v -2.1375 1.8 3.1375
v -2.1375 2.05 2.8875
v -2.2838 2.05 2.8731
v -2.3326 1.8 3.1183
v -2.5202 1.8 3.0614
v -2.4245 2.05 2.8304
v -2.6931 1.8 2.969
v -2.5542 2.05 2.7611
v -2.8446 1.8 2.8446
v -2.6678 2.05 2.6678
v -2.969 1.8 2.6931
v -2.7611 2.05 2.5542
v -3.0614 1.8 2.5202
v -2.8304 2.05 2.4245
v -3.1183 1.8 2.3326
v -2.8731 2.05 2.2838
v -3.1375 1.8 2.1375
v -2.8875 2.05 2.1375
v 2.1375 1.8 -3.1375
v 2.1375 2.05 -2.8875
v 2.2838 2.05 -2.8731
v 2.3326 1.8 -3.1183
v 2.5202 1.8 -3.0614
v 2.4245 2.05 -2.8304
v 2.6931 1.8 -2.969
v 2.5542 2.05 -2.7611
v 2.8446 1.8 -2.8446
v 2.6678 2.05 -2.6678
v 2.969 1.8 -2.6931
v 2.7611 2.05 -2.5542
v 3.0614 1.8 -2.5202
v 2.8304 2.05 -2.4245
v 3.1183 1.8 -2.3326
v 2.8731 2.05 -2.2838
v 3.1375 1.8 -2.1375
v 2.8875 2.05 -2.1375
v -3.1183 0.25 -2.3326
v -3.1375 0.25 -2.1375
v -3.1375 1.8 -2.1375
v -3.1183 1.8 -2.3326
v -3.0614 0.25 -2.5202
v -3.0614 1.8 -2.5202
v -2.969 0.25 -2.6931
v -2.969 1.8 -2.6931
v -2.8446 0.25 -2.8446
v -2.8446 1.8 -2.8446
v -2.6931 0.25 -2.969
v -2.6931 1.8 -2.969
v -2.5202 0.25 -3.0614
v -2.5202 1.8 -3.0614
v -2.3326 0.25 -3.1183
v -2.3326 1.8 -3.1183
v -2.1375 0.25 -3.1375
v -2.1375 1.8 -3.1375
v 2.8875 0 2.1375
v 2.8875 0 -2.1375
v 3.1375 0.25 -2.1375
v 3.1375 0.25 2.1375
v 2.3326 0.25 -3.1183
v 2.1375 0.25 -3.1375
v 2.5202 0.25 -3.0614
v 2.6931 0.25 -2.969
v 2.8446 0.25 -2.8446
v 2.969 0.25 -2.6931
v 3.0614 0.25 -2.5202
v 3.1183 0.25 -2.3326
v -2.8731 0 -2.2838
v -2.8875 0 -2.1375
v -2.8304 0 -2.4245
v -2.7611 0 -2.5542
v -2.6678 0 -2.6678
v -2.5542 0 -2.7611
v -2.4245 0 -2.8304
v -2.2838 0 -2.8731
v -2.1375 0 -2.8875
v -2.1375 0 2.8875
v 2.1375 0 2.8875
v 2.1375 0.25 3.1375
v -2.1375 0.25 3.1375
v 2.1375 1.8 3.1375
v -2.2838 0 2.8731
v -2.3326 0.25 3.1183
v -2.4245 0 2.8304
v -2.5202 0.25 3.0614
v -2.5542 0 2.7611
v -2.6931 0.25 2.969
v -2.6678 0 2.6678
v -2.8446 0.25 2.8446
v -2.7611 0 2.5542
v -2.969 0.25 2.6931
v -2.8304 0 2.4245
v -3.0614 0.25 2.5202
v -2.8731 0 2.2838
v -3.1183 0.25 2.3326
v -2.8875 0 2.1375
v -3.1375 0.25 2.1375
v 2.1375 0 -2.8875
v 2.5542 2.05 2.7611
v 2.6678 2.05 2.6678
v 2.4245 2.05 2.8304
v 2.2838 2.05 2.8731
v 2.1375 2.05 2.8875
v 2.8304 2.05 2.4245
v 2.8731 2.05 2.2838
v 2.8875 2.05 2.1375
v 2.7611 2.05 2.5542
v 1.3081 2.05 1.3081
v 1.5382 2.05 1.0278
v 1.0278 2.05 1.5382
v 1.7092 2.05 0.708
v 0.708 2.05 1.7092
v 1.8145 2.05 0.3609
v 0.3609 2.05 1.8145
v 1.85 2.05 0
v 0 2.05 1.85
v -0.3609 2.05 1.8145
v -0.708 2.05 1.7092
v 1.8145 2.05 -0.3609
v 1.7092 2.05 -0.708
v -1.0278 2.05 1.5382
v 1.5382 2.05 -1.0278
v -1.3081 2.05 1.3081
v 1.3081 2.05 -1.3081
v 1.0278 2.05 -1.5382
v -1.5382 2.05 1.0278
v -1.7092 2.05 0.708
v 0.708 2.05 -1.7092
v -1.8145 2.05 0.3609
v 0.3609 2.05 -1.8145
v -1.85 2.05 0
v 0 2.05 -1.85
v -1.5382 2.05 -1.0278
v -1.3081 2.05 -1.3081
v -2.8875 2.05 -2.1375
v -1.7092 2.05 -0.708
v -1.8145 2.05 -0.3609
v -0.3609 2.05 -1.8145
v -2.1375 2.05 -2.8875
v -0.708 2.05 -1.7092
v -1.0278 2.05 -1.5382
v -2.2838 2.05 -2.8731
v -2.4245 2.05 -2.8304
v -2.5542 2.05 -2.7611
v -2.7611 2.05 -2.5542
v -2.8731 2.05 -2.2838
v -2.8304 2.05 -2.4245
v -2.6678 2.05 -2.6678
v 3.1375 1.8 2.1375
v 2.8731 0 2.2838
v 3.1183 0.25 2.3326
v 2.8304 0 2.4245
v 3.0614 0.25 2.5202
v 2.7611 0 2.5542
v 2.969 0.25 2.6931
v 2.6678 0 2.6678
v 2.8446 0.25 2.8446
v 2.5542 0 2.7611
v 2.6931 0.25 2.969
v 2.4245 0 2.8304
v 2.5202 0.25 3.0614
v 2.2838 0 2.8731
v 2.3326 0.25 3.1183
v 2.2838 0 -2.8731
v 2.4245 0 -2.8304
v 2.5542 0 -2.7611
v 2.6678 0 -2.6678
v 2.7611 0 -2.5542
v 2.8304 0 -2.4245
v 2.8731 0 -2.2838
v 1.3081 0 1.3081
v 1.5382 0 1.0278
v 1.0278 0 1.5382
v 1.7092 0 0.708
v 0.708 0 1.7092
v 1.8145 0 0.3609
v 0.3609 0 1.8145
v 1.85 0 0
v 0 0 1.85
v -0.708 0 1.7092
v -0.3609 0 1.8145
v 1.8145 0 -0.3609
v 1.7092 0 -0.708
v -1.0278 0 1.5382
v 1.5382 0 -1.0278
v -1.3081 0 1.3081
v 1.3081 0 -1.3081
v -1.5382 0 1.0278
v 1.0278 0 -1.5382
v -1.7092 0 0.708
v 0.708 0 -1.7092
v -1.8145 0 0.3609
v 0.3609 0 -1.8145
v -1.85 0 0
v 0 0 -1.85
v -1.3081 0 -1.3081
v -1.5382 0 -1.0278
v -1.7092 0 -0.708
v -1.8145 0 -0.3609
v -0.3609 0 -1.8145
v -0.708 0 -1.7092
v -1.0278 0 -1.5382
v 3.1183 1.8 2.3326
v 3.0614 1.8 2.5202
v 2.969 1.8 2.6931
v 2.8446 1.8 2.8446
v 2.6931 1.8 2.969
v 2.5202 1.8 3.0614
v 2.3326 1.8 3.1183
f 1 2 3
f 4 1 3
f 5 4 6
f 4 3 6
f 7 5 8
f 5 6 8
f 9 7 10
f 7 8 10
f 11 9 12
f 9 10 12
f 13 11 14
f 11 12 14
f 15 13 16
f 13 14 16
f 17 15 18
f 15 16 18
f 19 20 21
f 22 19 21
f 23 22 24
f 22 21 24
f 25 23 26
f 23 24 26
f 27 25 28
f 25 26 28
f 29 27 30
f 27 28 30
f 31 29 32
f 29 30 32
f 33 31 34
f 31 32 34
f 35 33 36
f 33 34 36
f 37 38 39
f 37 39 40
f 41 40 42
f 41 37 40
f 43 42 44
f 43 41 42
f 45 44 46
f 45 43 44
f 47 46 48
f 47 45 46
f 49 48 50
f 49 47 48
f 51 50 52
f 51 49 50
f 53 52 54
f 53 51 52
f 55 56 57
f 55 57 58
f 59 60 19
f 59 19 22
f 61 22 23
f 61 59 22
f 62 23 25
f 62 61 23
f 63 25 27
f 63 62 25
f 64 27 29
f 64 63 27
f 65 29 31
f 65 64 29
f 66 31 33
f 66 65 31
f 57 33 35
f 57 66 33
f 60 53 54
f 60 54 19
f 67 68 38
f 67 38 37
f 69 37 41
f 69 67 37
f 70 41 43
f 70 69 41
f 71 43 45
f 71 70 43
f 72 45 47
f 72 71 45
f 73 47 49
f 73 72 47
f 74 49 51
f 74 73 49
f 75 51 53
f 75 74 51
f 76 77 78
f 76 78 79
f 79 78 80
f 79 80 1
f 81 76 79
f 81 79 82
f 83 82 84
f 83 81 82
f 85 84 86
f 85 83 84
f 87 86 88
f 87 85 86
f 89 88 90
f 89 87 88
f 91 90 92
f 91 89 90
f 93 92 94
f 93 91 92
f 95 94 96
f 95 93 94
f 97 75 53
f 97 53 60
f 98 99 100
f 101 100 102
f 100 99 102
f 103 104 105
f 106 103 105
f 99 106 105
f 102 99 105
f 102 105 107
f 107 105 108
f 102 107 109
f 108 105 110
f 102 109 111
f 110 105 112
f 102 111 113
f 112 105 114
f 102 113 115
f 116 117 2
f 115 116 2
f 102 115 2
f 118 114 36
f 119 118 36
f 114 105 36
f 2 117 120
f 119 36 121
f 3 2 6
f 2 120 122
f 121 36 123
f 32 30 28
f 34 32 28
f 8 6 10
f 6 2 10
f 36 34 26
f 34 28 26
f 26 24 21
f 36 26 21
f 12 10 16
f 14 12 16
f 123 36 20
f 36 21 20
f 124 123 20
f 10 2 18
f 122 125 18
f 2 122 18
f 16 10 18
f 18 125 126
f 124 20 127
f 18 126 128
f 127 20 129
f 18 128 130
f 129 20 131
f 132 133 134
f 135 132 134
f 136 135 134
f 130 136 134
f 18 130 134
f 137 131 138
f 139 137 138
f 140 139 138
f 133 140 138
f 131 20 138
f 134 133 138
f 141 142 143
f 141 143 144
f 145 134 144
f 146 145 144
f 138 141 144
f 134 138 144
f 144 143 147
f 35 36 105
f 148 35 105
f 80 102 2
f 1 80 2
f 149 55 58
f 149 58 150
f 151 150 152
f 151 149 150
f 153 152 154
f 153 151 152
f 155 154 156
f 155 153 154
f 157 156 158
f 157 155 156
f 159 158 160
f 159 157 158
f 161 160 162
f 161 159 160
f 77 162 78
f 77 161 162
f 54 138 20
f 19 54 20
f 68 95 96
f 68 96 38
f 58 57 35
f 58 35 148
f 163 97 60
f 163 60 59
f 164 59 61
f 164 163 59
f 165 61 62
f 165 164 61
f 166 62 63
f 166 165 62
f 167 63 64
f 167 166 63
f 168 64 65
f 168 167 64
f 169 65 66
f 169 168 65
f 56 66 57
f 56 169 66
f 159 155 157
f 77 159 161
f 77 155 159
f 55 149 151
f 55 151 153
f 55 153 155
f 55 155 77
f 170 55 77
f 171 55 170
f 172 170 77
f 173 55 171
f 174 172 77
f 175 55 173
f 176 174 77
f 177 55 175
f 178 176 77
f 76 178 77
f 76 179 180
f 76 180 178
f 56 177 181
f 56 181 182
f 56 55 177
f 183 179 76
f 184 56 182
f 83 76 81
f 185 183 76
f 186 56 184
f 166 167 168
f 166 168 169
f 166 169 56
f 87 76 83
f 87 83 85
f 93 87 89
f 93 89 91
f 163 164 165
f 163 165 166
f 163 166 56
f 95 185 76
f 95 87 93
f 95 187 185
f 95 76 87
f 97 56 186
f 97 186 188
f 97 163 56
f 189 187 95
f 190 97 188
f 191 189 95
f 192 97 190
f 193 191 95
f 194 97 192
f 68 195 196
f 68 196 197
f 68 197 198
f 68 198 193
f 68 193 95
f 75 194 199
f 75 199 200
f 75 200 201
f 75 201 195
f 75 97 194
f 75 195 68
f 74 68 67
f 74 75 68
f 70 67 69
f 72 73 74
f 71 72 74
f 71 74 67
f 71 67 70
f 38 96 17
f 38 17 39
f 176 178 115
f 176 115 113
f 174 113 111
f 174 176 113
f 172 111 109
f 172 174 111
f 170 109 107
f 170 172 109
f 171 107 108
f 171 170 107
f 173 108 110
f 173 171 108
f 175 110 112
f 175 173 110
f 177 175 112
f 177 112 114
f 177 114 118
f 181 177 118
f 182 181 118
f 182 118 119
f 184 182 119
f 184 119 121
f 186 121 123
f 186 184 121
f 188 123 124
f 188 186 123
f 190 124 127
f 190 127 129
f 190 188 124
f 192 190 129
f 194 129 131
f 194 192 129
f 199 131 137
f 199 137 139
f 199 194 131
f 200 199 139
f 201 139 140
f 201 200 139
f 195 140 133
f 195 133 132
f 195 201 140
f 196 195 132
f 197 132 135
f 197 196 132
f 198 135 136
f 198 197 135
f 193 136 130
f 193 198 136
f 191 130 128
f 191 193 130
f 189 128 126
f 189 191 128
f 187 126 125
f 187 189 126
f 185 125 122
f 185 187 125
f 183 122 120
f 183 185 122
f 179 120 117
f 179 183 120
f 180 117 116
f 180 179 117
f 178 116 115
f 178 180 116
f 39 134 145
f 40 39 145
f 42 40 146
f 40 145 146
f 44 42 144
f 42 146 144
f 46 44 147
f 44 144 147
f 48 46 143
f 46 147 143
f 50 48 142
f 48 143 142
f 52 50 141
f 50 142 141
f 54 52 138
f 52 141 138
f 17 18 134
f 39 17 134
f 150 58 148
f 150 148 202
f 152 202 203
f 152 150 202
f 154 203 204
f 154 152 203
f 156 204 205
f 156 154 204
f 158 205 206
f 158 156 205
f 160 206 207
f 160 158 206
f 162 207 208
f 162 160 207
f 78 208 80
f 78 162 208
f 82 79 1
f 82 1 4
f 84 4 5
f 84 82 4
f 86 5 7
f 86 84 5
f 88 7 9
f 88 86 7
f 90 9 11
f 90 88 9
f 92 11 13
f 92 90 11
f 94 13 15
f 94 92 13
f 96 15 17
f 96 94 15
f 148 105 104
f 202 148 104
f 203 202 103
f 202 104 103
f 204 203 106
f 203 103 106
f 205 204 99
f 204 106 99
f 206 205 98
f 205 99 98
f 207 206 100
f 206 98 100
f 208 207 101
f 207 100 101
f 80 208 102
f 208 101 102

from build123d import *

# Parameters (mm, degrees)
SKETCH1_R           = 1.85
BOSS_EXTRUDE1_DEPTH = 2.05
CHAMFER1_SIZE       = 0.25


with BuildPart() as part:
    # Sketch1 → Boss-Extrude1 (new body)
    with BuildSketch(Plane(origin=(0, 0, 0), x_dir=(1, 0, 0), z_dir=(0, 1, 0))):
        with BuildLine():
            Line((-2.1375, 3.1375), (2.1375, 3.1375))
            ThreePointArc((2.1375, 3.1375), (2.844606781, 2.844606781), (3.1375, 2.1375))
            Line((3.1375, 2.1375), (3.1375, -2.1375))
            ThreePointArc((3.1375, -2.1375), (2.844606781, -2.844606781), (2.1375, -3.1375))
            Line((2.1375, -3.1375), (-2.1375, -3.1375))
            ThreePointArc((-2.1375, -3.1375), (-2.844606781, -2.844606781), (-3.1375, -2.1375))
            Line((-3.1375, -2.1375), (-3.1375, 2.1375))
            ThreePointArc((-3.1375, 2.1375), (-2.844606781, 2.844606781), (-2.1375, 3.1375))
        make_face()
        with Locations(Location((0, 0, 0), (0, 0, 270))):
            Circle(SKETCH1_R, mode=Mode.SUBTRACT)
    extrude(amount=BOSS_EXTRUDE1_DEPTH)

    # Chamfer1
    chamfer1_edges = [part.edges().sort_by_distance(p)[0] for p in [
        (2.844606781, 2.05, -2.844606781),
        (3.1375, 0, 0),
        (2.844606781, 0, 2.844606781),
        (0, 2.05, -3.1375),
        (-2.844606781, 2.05, -2.844606781),
        (-3.1375, 2.05, 0),
        (-2.844606781, 2.05, 2.844606781),
        (0, 2.05, 3.1375),
        (2.844606781, 2.05, 2.844606781),
        (3.1375, 2.05, 0),
        (0, 0, 3.1375),
        (-2.844606781, 0, 2.844606781),
        (-3.1375, 0, 0),
        (-2.844606781, 0, -2.844606781),
        (0, 0, -3.1375),
        (2.844606781, 0, -2.844606781),
    ]]
    chamfer(chamfer1_edges, length=CHAMFER1_SIZE)


solid = part.part
